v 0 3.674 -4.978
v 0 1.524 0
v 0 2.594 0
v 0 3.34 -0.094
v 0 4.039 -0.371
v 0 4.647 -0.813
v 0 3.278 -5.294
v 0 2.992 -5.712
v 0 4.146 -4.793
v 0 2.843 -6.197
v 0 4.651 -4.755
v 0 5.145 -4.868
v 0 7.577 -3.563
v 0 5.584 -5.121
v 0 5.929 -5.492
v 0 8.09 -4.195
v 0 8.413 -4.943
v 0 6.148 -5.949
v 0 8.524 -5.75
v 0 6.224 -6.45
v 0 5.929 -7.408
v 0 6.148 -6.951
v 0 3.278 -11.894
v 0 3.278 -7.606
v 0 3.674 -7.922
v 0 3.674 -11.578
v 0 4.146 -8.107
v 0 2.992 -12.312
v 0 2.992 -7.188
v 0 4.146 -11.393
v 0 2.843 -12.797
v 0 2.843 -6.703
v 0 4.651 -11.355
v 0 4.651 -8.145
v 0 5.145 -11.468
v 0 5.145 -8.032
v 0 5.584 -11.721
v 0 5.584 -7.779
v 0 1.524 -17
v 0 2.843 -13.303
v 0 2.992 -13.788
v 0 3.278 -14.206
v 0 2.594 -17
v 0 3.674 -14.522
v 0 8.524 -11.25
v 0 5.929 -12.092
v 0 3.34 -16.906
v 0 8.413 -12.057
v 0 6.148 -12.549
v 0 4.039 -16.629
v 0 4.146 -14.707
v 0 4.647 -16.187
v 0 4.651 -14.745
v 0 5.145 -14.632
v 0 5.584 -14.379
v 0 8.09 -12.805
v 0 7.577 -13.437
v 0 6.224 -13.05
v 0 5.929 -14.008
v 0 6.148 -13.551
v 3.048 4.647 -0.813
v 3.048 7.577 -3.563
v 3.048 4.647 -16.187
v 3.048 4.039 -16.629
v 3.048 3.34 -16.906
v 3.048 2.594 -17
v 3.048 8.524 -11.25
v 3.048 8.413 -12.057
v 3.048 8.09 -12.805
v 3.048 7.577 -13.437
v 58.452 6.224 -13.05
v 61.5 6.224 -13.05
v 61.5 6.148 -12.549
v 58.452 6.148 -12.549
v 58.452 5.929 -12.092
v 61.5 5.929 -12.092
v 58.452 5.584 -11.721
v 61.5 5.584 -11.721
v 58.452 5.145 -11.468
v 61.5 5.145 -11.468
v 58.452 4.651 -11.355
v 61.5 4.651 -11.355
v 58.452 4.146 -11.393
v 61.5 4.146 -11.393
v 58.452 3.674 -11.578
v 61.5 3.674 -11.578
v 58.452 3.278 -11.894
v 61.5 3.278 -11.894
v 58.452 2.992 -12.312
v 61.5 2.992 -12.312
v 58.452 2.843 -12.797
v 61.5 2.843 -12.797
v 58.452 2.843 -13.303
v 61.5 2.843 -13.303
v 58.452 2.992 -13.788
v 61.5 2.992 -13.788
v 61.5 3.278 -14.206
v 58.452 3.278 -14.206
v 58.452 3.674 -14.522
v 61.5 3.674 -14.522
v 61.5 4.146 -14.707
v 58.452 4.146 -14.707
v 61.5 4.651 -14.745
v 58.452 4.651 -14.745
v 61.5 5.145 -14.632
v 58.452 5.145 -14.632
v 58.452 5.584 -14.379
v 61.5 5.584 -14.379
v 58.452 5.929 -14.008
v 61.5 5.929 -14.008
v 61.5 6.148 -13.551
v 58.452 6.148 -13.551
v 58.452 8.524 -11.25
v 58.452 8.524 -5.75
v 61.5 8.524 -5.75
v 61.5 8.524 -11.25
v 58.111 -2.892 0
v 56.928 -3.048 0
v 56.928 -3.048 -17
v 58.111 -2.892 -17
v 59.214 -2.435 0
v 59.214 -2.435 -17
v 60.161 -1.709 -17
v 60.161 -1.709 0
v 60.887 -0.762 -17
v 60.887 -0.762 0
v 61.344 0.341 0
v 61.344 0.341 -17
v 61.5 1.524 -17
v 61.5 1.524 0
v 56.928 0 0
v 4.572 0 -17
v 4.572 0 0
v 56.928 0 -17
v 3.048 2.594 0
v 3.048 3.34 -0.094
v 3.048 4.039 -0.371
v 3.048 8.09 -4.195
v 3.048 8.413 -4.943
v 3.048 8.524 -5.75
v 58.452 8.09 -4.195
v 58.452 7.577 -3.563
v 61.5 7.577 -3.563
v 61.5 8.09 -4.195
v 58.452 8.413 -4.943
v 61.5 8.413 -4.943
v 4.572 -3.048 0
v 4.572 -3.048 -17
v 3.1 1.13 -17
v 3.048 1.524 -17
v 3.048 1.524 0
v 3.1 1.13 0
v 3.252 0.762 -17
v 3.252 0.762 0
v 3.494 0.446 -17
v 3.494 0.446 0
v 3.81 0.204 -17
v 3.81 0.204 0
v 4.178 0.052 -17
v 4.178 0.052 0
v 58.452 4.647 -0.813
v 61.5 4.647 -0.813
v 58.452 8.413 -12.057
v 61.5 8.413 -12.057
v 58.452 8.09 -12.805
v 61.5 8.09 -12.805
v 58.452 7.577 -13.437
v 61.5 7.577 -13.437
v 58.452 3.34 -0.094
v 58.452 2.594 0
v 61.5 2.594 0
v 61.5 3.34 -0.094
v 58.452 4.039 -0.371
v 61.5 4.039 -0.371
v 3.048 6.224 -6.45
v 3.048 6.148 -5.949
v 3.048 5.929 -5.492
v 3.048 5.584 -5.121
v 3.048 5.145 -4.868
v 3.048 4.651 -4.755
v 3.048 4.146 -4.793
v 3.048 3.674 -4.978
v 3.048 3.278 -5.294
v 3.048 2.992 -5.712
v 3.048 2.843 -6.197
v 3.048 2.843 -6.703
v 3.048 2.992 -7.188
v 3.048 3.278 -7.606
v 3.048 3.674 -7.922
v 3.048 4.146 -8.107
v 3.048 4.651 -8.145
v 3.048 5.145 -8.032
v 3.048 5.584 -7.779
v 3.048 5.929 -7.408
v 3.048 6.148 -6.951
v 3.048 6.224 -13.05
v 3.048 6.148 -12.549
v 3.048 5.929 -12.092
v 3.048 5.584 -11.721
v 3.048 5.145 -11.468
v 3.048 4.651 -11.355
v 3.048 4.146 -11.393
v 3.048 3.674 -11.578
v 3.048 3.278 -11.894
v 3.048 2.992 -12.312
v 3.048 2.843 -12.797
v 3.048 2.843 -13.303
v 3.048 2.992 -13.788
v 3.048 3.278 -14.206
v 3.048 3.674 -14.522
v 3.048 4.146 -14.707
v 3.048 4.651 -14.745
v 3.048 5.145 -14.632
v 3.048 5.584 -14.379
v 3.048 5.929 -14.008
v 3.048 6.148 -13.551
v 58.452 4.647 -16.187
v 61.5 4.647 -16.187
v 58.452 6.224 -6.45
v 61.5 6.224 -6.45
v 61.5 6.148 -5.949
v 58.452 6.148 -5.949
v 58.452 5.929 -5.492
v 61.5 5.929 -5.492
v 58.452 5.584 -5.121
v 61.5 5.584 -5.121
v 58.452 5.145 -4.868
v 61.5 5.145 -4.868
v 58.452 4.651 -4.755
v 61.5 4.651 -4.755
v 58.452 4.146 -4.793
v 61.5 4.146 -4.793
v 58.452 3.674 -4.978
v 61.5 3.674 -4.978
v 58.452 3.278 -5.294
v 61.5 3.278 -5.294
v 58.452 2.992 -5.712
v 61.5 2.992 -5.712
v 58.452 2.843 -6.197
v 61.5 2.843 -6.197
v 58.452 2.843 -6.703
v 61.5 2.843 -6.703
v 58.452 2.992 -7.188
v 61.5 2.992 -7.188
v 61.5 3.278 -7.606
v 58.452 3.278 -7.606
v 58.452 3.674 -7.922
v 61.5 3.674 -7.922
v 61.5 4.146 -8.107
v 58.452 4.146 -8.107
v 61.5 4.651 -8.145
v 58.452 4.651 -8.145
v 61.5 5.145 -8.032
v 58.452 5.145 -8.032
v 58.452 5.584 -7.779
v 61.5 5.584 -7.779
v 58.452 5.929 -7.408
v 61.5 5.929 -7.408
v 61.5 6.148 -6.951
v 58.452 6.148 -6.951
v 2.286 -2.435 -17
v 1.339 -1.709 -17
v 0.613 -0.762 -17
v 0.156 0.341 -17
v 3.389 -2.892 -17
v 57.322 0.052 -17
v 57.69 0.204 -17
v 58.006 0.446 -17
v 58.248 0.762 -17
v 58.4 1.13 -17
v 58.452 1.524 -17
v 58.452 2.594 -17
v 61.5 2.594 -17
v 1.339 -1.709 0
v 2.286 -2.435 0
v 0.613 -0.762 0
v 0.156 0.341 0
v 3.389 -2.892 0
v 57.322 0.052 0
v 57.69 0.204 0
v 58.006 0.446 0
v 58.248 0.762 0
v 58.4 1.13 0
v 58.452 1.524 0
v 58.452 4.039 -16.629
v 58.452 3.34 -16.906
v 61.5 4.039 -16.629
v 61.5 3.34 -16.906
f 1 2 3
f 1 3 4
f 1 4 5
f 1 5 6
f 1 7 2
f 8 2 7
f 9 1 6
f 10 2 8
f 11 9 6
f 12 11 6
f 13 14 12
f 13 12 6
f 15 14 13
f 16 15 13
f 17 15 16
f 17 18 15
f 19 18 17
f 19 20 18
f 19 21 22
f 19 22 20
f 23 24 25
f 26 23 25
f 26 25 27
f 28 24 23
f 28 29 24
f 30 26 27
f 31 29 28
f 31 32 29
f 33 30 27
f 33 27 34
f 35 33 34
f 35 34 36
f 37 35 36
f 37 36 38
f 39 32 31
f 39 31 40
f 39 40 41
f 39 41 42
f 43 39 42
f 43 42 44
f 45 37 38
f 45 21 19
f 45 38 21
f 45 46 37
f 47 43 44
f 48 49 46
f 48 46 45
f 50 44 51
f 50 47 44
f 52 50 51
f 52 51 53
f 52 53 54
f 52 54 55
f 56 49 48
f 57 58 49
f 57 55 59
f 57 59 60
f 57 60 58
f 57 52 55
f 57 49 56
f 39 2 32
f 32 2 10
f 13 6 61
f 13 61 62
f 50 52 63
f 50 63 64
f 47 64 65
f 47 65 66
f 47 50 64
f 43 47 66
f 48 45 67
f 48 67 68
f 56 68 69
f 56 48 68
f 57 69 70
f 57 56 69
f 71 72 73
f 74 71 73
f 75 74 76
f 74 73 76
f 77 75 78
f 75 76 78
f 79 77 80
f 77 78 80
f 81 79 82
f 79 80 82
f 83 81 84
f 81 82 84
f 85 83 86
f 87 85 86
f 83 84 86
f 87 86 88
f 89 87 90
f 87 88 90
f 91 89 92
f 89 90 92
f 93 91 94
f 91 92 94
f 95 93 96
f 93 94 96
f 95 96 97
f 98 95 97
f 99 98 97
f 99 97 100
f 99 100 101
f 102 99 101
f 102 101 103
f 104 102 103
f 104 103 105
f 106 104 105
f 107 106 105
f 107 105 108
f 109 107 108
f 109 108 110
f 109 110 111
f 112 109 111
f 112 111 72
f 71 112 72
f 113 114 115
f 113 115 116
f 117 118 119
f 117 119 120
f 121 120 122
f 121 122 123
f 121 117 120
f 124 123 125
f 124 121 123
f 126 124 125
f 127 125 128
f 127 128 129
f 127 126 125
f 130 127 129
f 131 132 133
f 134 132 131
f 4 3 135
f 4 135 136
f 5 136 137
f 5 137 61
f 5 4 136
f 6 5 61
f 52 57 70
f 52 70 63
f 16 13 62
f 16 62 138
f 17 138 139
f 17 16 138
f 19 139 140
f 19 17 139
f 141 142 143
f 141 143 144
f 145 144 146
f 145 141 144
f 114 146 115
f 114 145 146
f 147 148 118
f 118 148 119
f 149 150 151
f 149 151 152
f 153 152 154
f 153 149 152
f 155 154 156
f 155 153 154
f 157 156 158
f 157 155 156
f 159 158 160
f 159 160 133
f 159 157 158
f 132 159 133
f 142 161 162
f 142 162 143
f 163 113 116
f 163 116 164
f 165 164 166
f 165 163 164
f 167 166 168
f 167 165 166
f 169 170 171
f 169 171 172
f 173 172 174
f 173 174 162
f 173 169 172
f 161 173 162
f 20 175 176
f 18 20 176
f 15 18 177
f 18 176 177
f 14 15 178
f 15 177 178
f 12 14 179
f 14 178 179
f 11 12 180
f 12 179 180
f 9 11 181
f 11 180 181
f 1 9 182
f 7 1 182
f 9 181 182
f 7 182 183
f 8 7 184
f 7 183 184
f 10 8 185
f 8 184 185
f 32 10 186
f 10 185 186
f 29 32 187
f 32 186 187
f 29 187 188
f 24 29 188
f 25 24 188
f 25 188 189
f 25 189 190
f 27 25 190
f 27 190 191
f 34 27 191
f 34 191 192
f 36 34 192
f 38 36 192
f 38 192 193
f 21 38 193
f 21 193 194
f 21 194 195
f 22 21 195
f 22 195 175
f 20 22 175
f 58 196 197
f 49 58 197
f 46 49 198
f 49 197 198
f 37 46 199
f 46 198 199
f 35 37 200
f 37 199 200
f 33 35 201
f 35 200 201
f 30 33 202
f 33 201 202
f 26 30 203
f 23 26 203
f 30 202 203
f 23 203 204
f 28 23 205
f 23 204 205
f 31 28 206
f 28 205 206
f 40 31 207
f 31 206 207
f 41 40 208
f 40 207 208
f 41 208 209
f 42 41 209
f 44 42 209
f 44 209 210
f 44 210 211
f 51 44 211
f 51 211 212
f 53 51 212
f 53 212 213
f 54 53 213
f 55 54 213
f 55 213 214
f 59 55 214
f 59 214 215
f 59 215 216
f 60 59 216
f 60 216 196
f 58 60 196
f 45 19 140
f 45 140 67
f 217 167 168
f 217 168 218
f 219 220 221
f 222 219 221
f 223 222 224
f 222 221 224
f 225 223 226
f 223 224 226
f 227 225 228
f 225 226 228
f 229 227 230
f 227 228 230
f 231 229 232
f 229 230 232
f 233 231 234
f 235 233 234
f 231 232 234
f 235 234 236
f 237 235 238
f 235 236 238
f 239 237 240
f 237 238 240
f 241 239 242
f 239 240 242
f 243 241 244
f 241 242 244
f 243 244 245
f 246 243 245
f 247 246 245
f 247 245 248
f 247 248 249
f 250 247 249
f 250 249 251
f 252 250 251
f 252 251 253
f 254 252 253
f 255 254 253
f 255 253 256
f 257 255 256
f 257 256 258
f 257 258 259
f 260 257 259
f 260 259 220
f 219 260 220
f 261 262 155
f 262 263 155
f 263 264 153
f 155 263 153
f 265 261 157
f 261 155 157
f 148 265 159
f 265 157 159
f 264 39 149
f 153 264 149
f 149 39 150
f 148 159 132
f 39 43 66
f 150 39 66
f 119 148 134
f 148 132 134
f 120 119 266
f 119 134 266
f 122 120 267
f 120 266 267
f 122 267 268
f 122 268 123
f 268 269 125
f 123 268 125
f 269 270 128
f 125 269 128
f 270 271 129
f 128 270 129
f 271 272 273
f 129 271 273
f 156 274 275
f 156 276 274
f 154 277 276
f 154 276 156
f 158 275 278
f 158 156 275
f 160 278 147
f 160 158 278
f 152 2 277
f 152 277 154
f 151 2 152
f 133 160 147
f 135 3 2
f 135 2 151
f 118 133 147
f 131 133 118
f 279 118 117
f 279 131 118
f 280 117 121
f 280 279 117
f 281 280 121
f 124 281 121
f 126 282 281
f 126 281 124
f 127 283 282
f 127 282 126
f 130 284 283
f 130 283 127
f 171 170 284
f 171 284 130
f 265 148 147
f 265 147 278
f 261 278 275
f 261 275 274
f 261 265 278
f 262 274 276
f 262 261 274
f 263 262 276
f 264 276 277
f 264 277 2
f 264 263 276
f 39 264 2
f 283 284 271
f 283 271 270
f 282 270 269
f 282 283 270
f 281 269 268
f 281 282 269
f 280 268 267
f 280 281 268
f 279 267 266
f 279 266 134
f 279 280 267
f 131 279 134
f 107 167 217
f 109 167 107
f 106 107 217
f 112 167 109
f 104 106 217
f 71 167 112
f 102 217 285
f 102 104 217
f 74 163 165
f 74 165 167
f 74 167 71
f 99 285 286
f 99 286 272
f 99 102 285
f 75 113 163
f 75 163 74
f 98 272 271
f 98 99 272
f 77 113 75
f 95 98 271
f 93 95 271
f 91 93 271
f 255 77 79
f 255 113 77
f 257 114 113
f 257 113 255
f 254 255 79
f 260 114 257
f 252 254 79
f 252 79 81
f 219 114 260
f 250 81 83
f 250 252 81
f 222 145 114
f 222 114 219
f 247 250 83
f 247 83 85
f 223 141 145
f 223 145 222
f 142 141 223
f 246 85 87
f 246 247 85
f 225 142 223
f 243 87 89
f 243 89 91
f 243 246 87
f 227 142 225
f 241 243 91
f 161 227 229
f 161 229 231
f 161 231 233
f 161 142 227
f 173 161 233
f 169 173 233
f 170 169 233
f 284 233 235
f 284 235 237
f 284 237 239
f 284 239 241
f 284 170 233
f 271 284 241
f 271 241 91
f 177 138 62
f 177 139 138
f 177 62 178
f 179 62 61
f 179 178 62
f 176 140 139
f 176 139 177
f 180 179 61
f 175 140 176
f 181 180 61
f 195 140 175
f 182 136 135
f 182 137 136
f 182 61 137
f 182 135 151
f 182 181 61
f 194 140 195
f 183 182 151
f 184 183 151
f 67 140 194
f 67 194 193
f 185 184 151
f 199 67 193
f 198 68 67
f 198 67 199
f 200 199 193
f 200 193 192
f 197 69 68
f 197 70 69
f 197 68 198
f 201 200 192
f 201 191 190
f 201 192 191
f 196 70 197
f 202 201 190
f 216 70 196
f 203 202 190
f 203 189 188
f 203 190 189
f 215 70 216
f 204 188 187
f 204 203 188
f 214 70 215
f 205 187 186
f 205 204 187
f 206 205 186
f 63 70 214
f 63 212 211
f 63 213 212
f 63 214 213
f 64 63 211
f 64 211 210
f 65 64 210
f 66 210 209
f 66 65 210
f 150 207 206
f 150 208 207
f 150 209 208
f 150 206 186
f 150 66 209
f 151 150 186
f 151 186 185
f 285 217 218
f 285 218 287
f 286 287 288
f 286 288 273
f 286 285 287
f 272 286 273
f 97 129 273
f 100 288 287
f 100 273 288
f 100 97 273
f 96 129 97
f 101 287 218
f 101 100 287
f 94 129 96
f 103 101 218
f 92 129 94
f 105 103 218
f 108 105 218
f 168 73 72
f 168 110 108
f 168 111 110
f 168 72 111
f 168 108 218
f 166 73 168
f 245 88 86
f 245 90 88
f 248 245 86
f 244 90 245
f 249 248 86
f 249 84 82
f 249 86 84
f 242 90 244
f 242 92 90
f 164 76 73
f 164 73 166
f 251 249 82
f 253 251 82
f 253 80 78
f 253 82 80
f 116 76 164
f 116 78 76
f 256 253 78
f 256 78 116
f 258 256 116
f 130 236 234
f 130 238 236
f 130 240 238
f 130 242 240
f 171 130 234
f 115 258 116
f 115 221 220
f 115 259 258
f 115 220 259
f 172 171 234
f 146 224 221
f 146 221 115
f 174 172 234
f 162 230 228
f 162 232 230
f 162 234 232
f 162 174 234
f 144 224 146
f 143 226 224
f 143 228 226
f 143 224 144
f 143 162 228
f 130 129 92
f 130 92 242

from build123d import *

# Parameters (mm, degrees)
SKETCH20_W                     = 61.5
SKETCH20_H                     = 17
BASE_FLANGE1_DEPTH             = 3.048
EDGE_FLANGE1_STRIP_W           = 15.24
EDGE_FLANGE1_STRIP_H           = 3.048
EDGE_FLANGE1_STRIP_CUT_DEPTH   = 17
EDGE_FLANGE1_STRIP_2_W         = 15.24
EDGE_FLANGE1_STRIP_2_H         = 3.048
EDGE_FLANGE1_STRIP_CUT_2_DEPTH = 17
EDGE_FLANGE1_DEPTH             = 17
EDGE_FLANGE1_BEND_DEPTH        = 17
CUT_EXTRUDE3_DEPTH             = 66.770177923
CUT_EXTRUDE3_DEPTH_BACK        = 66.770177923
M3_CLEARANCE_HOLE1_D           = 3.4


# Sheet-metal steps are written as plain solids
with BuildPart() as part:
    # Sketch20 → Base-Flange1 (new body)
    with BuildSketch(Plane(origin=(0, 0, 0), x_dir=(1, 0, 0), z_dir=(0, 1, 0))):
        with Locations((30.75, 8.5)):
            Rectangle(SKETCH20_W, SKETCH20_H)
    extrude(amount=-BASE_FLANGE1_DEPTH)

    # Edge-Flange1 strip (across the edge) → Edge-Flange1 strip cut (cut)
    with BuildSketch(Plane.XY.offset(-17)):
        with Locations((-3.048, -1.524)):
            Rectangle(EDGE_FLANGE1_STRIP_W, EDGE_FLANGE1_STRIP_H)
    extrude(amount=EDGE_FLANGE1_STRIP_CUT_DEPTH, mode=Mode.SUBTRACT)

    # Edge-Flange1 strip 2 (across the edge) → Edge-Flange1 strip cut 2 (cut)
    with BuildSketch(Plane(origin=(61.5, 0, 0), x_dir=(-1, 0, 0), z_dir=(0, 0, -1))):
        with Locations((-3.048, -1.524)):
            Rectangle(EDGE_FLANGE1_STRIP_2_W, EDGE_FLANGE1_STRIP_2_H)
    extrude(amount=EDGE_FLANGE1_STRIP_CUT_2_DEPTH, mode=Mode.SUBTRACT)

    # Edge-Flange1 section (across the edge) → Edge-Flange1 (add)
    with BuildSketch(Plane.XY.offset(-17)):
        with BuildLine():
            Line((0, 1.524), (0, 15.952))
            Line((0, 15.952), (3.048, 15.952))
            Line((3.048, 15.952), (3.048, 1.524))
            ThreePointArc((3.048, 1.524), (3.494369265, 0.446369265), (4.572, 0))
            Line((4.572, 0), (4.572, -3.048))
            ThreePointArc((4.572, -3.048), (1.339107796, -1.708892204), (0, 1.524))
        make_face()
    extrude(amount=EDGE_FLANGE1_DEPTH)

    # Edge-Flange1 section 2 (across the edge) → Edge-Flange1 bend (add)
    with BuildSketch(Plane(origin=(61.5, 0, 0), x_dir=(-1, 0, 0), z_dir=(0, 0, -1))):
        with BuildLine():
            Line((0, 1.524), (0, 15.952))
            Line((0, 15.952), (3.048, 15.952))
            Line((3.048, 15.952), (3.048, 1.524))
            ThreePointArc((3.048, 1.524), (3.494369265, 0.446369265), (4.572, 0))
            Line((4.572, 0), (4.572, -3.048))
            ThreePointArc((4.572, -3.048), (1.339107796, -1.708892204), (0, 1.524))
        make_face()
    extrude(amount=EDGE_FLANGE1_BEND_DEPTH)

    # Sketch29 → Cut-Extrude3 (cut, two sides: drawn at the far end of the back side and taken through both)
    with BuildSketch(Plane(origin=(0, 0, 0), x_dir=(0, 0, -1), z_dir=(1, 0, 0)).offset(-CUT_EXTRUDE3_DEPTH_BACK)):
        with BuildLine():
            Line((0, 1.524), (0, 2.594))
            ThreePointArc((0, 2.594), (0.210525003, 3.698005998), (0.812552829, 4.647064751))
            Line((0.812552829, 4.647064751), (3.562552829, 7.577064751))
            ThreePointArc((3.562552829, 7.577064751), (4.558193441, 8.277106814), (5.75, 8.524))
            Line((5.75, 8.524), (11.25, 8.524))
            ThreePointArc((11.25, 8.524), (12.441806559, 8.277106814), (13.437447171, 7.577064751))
            Line((13.437447171, 7.577064751), (16.187447171, 4.647064751))
            ThreePointArc((16.187447171, 4.647064751), (16.789474997, 3.698005998), (17, 2.594))
            Line((17, 2.594), (17, 1.524))
            Line((17, 1.524), (21.797856885, 1.524))
            Line((21.797856885, 1.524), (21.797856885, 17.003274098))
            Line((21.797856885, 17.003274098), (-4.797856885, 17.003274098))
            Line((-4.797856885, 17.003274098), (-4.797856885, 1.524))
            Line((-4.797856885, 1.524), (0, 1.524))
        make_face()
    extrude(amount=CUT_EXTRUDE3_DEPTH + CUT_EXTRUDE3_DEPTH_BACK, mode=Mode.SUBTRACT)

    # M3 Clearance Hole1 (through all)
    with Locations(Plane(origin=(0, 4.524, -13.05), x_dir=(0, -1, 0), z_dir=(-1, 0, 0))):
        with Locations((0, 0), (0, 6.6)):
            Hole(M3_CLEARANCE_HOLE1_D / 2)


solid = part.part
